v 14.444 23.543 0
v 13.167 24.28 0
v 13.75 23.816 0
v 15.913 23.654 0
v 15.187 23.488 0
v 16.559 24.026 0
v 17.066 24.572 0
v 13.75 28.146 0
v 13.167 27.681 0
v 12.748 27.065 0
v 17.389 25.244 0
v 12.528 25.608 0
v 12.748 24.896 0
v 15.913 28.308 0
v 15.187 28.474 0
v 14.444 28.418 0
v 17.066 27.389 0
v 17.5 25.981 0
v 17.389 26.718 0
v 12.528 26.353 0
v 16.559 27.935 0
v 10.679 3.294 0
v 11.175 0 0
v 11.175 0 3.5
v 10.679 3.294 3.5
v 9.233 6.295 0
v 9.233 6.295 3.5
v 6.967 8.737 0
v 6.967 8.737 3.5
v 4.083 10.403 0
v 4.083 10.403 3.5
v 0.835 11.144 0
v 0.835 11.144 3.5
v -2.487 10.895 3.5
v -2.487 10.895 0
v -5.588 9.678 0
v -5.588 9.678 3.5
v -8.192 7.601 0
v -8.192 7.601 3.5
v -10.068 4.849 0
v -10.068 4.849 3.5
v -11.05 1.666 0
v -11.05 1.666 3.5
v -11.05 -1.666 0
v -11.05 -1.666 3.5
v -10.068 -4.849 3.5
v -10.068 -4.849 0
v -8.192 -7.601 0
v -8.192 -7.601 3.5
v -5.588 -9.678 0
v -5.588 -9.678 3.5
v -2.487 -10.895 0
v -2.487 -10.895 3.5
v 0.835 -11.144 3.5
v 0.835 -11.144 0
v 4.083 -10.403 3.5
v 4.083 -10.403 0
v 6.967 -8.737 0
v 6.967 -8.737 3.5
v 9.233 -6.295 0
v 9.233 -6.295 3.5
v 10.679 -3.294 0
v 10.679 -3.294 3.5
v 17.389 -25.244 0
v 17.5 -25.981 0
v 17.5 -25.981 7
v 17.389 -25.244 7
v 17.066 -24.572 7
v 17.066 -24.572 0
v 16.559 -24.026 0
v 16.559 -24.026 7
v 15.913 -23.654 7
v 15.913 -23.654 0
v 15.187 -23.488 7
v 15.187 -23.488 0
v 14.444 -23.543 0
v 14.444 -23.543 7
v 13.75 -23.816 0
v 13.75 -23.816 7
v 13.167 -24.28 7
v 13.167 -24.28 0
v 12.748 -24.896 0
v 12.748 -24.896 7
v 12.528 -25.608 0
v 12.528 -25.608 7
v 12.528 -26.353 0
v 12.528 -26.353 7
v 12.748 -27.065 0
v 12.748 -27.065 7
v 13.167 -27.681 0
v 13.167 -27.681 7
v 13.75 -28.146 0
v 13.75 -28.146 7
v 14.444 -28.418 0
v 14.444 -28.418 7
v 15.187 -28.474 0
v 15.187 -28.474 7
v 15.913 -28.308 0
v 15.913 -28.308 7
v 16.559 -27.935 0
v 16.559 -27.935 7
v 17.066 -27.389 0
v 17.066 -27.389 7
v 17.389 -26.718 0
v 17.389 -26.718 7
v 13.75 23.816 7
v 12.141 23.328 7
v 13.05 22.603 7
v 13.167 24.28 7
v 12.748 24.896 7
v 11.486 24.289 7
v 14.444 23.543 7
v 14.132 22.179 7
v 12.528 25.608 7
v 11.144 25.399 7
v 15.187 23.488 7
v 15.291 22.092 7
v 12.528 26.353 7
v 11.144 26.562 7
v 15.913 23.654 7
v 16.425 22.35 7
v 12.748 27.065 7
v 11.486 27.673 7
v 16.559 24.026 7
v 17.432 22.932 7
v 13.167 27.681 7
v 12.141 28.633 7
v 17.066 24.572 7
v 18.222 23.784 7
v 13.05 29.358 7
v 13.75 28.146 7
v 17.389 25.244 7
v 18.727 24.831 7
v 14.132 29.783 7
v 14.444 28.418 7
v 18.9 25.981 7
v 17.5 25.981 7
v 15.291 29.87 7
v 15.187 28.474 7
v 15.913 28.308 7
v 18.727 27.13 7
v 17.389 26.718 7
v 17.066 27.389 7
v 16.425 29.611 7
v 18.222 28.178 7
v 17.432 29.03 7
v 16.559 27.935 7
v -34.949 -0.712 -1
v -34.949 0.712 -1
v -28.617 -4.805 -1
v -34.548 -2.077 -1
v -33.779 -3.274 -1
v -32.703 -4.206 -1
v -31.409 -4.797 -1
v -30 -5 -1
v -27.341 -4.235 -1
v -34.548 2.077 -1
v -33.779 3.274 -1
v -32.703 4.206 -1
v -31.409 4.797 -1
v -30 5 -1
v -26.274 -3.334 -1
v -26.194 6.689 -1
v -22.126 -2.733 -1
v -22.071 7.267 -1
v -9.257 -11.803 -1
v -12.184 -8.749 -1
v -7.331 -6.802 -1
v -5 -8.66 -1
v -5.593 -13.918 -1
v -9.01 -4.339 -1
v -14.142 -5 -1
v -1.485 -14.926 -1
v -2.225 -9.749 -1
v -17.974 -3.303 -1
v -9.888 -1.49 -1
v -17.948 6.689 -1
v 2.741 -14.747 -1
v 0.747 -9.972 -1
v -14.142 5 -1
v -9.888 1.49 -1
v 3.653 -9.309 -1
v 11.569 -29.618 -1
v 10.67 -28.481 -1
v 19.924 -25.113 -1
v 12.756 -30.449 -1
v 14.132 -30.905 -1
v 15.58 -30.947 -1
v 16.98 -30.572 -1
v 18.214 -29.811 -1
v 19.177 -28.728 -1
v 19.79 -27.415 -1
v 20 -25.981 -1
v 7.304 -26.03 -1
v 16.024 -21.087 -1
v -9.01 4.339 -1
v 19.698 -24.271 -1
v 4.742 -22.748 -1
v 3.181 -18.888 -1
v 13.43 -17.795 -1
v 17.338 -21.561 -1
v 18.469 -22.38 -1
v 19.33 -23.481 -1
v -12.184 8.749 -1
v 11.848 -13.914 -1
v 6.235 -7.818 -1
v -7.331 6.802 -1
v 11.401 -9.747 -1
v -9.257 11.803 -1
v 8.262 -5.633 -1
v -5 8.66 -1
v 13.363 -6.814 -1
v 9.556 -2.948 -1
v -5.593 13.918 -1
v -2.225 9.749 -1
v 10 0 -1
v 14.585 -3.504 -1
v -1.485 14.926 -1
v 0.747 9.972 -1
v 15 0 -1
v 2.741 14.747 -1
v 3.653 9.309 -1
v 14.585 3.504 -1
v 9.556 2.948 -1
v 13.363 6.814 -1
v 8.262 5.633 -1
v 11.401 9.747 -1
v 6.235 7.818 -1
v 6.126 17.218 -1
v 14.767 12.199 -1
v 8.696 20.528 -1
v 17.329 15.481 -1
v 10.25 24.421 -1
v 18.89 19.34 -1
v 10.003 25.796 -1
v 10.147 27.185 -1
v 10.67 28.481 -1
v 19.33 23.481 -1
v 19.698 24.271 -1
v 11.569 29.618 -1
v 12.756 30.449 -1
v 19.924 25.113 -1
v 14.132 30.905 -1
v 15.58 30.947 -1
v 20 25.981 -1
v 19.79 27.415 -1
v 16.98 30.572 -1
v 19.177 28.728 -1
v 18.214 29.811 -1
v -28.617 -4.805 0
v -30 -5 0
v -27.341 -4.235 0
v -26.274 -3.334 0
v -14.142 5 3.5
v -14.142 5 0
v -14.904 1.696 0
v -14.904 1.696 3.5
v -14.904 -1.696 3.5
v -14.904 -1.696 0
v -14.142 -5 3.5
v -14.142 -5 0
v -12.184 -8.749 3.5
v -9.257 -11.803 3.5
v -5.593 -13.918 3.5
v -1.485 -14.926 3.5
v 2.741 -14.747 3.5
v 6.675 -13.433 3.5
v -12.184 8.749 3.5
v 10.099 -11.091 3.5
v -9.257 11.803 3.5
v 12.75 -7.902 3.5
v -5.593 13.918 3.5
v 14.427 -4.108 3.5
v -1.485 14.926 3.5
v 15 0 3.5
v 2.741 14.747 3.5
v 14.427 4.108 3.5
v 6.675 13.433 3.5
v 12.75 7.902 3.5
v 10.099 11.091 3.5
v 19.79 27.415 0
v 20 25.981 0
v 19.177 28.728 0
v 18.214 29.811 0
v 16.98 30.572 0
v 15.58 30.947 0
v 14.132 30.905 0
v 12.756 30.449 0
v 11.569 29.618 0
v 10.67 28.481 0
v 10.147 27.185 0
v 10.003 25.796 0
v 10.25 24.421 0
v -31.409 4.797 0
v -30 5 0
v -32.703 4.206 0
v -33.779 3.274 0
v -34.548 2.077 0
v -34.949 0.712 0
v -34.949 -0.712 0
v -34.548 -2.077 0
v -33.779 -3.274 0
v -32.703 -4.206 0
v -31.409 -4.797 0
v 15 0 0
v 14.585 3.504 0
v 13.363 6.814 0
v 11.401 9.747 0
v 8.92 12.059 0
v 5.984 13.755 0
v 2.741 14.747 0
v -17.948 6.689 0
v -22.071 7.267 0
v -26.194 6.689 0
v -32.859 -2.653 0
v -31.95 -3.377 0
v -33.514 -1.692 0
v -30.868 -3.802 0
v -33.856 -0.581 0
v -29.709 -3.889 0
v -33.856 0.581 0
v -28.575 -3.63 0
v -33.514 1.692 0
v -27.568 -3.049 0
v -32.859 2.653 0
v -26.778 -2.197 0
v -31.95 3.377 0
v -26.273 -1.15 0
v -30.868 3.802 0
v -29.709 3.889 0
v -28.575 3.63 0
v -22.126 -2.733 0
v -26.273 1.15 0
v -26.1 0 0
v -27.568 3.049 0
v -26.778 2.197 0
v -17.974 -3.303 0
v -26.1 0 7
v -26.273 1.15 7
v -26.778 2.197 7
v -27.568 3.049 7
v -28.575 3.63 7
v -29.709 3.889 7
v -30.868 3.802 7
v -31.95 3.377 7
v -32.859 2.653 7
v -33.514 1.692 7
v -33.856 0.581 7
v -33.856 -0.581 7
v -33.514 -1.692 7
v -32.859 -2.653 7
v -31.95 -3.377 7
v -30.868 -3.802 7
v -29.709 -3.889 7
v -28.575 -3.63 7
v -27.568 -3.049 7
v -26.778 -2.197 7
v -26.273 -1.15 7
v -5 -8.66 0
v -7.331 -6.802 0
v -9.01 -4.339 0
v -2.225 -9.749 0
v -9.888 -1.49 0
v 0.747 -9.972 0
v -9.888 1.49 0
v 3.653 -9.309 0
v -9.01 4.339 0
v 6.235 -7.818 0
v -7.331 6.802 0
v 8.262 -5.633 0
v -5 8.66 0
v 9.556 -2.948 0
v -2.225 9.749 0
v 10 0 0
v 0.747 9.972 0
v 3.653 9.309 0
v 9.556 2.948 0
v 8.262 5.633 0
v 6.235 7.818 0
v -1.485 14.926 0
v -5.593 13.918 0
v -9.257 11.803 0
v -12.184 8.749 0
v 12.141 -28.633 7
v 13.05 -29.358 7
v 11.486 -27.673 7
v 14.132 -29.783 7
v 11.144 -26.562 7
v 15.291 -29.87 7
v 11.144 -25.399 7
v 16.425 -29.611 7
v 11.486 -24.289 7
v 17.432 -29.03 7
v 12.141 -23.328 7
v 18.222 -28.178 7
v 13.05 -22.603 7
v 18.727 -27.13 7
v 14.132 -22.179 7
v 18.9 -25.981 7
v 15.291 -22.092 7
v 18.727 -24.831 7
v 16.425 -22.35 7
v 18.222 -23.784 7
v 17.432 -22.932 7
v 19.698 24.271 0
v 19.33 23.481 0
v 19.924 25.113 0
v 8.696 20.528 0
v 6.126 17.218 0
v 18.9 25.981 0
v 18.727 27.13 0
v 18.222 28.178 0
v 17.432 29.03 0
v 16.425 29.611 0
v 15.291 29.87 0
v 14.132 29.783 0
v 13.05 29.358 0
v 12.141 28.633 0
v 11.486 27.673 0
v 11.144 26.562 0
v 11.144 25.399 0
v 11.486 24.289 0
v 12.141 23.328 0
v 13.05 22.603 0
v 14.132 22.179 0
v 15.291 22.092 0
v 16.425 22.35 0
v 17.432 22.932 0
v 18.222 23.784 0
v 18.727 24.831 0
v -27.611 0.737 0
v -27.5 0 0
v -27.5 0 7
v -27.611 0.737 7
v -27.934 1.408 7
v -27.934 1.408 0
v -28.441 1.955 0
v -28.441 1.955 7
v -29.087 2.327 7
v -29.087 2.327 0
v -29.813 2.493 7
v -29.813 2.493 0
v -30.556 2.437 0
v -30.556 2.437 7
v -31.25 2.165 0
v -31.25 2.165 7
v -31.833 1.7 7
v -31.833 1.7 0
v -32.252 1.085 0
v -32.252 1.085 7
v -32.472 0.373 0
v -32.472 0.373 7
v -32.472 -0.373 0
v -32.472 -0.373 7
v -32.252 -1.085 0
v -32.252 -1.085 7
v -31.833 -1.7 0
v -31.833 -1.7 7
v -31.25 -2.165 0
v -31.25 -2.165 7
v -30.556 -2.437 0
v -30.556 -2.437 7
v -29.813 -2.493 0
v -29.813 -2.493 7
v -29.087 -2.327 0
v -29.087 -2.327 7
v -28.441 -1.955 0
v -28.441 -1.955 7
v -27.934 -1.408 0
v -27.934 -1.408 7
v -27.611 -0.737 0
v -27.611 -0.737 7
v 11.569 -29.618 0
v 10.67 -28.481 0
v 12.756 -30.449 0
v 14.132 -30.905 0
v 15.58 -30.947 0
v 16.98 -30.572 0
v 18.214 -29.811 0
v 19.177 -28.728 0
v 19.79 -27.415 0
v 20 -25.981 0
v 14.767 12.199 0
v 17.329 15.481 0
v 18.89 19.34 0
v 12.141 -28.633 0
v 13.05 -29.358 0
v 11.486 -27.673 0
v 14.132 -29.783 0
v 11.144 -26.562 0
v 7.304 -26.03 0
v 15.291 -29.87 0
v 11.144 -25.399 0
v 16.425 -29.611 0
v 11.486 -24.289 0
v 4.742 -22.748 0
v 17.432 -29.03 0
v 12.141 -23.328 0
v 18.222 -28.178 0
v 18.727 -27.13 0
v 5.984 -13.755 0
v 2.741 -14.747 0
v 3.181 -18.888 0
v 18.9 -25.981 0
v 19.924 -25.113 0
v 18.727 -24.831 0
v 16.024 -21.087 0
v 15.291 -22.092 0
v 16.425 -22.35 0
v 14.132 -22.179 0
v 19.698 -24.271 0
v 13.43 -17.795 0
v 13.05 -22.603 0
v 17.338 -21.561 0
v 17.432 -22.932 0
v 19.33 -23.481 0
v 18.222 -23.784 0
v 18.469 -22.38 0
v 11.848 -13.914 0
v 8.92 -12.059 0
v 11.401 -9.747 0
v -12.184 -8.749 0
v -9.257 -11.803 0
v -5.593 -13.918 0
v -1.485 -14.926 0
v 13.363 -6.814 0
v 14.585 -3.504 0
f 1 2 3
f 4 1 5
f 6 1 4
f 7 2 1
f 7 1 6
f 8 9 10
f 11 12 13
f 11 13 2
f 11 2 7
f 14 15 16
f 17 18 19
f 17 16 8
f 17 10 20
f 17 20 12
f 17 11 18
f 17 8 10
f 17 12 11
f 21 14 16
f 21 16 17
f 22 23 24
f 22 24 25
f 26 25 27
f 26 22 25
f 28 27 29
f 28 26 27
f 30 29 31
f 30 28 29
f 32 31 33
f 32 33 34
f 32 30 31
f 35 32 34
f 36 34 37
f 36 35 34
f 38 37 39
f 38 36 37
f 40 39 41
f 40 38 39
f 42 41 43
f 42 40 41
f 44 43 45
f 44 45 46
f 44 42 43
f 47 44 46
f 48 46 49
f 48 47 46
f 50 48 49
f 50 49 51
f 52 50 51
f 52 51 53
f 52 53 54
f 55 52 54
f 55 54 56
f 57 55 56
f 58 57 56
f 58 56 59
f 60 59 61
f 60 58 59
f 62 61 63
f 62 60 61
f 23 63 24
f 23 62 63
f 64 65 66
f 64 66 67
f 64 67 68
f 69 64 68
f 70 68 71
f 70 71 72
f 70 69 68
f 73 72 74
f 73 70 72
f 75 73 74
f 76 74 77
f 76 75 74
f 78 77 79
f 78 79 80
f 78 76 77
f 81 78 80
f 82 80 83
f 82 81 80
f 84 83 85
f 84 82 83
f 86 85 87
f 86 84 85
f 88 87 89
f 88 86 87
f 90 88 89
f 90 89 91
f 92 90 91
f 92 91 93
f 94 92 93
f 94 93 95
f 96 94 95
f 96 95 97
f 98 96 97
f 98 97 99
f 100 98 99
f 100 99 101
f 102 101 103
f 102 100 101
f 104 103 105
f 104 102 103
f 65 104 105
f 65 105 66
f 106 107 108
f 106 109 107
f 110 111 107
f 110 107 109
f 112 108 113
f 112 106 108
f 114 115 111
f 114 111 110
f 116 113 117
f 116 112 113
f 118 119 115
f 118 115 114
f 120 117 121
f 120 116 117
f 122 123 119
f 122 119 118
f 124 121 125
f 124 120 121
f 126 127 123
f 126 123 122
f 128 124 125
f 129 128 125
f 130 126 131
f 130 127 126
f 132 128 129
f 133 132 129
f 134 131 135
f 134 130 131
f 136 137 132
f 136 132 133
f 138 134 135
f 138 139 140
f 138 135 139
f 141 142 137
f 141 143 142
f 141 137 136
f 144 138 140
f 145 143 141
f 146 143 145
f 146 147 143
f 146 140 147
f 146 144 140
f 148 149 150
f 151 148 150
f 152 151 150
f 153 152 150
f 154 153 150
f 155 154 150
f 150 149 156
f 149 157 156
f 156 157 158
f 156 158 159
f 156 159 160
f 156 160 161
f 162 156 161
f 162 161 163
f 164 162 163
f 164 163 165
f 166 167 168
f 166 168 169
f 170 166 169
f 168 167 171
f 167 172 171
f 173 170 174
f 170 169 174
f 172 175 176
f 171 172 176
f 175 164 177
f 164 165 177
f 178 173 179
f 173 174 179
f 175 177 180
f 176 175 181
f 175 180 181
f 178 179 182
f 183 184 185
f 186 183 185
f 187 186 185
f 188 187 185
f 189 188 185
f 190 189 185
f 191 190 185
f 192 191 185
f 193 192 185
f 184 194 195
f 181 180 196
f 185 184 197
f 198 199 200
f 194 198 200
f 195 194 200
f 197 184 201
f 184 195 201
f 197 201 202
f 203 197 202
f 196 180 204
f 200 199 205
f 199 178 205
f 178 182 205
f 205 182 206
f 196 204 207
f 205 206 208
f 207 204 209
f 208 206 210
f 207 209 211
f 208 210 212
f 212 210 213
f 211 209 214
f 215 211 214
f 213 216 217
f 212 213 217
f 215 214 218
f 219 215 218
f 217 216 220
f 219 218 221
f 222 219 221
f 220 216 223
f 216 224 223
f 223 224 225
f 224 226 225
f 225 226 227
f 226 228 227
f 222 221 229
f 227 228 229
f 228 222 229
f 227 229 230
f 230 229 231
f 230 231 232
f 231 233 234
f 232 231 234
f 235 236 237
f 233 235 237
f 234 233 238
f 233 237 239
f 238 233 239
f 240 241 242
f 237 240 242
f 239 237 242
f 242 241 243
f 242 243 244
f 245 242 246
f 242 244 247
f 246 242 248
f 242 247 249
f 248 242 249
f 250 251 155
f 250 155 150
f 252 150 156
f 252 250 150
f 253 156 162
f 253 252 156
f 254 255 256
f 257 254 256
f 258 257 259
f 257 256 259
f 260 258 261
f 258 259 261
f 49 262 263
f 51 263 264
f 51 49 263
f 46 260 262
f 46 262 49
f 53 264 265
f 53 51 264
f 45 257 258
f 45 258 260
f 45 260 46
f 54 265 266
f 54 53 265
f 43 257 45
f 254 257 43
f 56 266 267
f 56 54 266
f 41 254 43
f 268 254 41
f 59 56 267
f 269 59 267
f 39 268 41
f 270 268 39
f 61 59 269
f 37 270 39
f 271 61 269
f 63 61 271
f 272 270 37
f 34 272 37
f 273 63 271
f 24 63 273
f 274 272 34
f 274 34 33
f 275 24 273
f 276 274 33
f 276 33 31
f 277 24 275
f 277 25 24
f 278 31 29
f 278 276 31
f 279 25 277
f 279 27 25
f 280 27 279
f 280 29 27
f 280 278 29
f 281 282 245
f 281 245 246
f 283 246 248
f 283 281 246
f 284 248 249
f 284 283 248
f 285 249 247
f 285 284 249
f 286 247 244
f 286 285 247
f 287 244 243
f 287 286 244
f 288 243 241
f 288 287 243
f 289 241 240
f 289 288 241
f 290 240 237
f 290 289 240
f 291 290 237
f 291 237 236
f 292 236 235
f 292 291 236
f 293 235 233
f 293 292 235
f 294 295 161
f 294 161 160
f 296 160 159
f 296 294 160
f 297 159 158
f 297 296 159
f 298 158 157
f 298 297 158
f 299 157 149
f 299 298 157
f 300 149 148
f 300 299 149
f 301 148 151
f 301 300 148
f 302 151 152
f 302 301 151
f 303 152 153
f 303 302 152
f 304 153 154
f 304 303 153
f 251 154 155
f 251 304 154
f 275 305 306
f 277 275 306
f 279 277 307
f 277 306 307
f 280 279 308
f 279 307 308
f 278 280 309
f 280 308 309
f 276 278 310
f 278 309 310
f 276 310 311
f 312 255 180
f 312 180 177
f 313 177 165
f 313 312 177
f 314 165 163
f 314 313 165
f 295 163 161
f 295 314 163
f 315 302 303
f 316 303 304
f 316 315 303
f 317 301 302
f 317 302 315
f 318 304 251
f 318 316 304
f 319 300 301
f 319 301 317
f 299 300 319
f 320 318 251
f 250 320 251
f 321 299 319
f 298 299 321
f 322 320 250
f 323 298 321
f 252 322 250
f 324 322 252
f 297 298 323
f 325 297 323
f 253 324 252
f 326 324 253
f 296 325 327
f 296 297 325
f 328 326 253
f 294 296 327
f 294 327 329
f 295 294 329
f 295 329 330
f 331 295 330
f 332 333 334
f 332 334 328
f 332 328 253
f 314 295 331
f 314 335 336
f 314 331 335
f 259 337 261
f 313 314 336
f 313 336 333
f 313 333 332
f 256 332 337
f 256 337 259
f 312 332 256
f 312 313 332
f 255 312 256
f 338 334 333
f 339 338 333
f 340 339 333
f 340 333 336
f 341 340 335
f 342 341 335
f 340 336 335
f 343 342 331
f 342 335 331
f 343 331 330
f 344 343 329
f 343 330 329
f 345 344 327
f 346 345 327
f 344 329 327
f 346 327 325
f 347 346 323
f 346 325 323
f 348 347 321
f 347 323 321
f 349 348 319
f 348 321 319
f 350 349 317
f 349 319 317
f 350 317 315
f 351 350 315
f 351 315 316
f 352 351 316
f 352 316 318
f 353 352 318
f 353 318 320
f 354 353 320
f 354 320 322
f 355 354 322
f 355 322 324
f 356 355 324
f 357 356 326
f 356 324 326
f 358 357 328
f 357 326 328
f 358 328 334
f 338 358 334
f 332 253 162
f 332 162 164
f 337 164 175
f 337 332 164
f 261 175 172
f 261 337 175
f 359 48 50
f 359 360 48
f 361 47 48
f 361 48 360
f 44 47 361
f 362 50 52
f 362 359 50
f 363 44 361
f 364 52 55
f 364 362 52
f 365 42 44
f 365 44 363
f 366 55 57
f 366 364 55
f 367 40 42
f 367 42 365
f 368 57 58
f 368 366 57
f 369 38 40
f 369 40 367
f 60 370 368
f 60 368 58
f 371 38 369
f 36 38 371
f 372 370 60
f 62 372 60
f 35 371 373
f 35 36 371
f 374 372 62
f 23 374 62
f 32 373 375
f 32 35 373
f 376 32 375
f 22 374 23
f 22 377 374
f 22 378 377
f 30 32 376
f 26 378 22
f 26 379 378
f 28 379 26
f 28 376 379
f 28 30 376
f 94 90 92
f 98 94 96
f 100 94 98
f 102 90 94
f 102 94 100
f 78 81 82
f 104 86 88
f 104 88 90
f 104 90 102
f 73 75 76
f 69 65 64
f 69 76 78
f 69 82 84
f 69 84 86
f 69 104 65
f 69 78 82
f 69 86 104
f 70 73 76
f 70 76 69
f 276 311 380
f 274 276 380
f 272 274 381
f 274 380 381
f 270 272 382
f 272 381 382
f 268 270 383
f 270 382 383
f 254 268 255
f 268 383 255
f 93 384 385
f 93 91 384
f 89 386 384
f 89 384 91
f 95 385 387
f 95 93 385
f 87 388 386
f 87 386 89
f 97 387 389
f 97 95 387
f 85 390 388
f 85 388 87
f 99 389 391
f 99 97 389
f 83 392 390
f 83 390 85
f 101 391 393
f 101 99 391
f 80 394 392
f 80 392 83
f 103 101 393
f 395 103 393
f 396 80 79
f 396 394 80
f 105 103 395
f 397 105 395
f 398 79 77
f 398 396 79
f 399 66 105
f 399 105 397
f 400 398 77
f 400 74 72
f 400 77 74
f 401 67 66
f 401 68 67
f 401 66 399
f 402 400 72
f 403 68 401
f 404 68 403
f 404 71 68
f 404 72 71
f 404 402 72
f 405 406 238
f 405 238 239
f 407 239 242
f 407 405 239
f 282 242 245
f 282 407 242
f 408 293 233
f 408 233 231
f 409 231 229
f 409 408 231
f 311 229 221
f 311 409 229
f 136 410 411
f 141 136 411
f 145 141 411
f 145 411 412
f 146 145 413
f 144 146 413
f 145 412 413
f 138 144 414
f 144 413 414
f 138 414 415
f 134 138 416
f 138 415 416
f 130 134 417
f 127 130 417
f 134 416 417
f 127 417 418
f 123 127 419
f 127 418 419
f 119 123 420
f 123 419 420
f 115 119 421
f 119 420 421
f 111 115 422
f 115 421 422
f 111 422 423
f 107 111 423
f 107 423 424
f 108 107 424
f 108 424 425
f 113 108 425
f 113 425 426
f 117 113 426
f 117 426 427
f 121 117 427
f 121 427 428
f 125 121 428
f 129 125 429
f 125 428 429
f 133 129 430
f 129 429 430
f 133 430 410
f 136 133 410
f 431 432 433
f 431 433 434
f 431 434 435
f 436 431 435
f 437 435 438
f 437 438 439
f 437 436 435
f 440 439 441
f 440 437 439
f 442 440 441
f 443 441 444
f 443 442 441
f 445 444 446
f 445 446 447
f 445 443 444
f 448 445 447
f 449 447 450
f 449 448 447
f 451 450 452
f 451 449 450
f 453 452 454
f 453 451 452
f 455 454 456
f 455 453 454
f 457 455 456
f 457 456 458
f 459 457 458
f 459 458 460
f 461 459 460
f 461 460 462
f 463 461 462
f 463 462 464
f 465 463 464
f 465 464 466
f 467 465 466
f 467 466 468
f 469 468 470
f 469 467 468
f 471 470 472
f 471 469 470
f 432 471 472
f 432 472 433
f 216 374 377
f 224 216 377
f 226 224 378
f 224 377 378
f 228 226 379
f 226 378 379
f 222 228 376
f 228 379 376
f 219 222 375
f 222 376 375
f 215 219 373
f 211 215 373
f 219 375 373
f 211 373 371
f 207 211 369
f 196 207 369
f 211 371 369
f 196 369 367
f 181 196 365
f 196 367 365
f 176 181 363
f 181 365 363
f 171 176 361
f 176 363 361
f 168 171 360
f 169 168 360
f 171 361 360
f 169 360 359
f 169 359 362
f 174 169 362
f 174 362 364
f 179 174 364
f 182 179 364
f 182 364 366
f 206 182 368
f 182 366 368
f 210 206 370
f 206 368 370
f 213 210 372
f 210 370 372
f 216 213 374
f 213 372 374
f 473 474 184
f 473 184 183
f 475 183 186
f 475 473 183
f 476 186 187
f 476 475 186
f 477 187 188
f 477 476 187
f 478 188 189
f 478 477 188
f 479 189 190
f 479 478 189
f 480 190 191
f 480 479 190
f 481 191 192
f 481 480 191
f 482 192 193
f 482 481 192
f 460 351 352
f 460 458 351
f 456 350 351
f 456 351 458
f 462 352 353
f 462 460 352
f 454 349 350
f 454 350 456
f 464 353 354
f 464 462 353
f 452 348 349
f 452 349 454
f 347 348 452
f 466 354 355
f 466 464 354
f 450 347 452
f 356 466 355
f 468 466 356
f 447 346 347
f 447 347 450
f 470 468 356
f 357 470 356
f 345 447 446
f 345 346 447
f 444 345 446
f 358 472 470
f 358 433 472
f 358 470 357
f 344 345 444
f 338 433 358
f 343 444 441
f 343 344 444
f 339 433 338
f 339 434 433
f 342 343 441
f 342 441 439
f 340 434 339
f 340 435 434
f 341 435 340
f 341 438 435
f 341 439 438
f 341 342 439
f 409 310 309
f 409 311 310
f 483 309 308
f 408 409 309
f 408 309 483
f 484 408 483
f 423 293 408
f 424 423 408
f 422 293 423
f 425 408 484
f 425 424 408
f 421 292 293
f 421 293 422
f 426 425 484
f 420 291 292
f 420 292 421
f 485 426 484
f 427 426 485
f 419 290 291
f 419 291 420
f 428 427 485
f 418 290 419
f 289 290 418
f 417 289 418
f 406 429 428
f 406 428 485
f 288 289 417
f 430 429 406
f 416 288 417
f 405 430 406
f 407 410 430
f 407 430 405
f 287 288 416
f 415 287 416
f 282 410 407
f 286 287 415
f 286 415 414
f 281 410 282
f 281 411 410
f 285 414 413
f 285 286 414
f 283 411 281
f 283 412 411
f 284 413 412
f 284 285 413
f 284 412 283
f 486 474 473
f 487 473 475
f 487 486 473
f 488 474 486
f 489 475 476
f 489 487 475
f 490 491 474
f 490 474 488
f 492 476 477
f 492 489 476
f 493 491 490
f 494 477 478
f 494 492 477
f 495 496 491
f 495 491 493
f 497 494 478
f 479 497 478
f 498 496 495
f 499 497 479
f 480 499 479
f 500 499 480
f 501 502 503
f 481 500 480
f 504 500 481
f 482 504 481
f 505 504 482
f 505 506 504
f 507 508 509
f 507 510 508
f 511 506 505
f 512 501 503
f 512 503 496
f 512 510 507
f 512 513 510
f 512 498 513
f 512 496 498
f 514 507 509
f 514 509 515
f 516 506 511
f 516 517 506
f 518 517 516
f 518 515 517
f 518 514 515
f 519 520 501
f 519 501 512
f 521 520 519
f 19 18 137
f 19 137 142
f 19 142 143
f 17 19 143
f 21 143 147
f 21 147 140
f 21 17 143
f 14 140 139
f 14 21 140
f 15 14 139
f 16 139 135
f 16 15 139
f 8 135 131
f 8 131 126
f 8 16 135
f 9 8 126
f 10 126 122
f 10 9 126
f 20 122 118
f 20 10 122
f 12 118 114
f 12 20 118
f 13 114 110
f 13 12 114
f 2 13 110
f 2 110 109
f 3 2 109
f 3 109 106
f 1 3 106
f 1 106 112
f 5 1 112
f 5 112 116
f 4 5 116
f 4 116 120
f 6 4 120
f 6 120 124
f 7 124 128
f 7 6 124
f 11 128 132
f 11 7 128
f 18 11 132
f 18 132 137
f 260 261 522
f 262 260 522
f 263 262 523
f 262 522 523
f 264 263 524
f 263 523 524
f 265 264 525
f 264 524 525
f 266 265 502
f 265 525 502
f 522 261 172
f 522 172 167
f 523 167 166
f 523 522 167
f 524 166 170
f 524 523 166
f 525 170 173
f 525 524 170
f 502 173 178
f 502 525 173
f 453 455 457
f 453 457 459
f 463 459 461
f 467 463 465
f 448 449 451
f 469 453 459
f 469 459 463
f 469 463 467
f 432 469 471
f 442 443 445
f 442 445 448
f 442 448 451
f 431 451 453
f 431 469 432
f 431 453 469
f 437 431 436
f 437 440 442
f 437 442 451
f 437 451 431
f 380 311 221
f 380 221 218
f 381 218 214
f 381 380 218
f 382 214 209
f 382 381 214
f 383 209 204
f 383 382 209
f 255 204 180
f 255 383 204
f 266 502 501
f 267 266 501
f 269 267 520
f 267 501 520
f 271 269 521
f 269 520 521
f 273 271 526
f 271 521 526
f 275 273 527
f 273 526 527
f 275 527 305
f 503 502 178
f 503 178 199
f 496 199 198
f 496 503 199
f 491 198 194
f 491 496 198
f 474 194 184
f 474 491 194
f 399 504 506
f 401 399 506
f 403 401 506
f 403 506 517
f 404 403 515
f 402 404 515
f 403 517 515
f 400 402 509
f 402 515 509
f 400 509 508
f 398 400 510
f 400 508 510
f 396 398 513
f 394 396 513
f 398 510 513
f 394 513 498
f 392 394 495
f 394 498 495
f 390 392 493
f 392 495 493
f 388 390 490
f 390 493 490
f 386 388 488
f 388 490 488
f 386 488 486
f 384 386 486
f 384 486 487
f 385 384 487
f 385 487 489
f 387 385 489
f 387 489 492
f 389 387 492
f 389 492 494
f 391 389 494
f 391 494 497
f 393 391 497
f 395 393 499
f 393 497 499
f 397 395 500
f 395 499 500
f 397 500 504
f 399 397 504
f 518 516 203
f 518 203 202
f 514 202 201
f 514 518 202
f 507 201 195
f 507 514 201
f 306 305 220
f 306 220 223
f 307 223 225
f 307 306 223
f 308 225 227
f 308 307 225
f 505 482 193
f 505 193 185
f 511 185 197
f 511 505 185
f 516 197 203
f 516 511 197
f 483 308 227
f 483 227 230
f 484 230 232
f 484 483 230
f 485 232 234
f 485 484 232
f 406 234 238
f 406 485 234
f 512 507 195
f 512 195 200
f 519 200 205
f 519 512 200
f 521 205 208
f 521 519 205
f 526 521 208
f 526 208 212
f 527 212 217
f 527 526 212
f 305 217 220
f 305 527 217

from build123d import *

# Parameters (mm, degrees)
F0_R     = 11.175
F0_R_2   = 10
F0_R_3   = 3.9
F0_R_4   = 2.5
F1_DEPTH = 1
F2_DEPTH = 7
F3_DEPTH = 3.5


with BuildPart() as f1:
    # F0 (on Top) → F1 (new body)
    with BuildSketch(Plane.XY):
        with BuildLine():
            ThreePointArc((11.4011948308, -9.7474487139), (14.0715656993, -5.1952900563), (15, 0))
            ThreePointArc((15, 0), (14.0715656993, 5.1952900563), (11.4011948308, 9.7474487139))
            ThreePointArc((11.4011948308, 9.7474487139), (7.5, 12.9903810568), (2.7409407929, 14.7474487139))
            ThreePointArc((2.7409407929, 14.7474487139), (-7.5, 12.9903810568), (-14.1421356237, 5))
            ThreePointArc((-14.1421356237, 5), (-15, 0), (-14.1421356237, -5))
            ThreePointArc((-14.1421356237, -5), (-7.5, -12.9903810568), (2.7409407929, -14.7474487139))
            ThreePointArc((2.7409407929, -14.7474487139), (7.5, -12.9903810568), (11.4011948308, -9.7474487139))
        make_face()
        Circle(F0_R, mode=Mode.SUBTRACT)
        Circle(F0_R)
        Circle(F0_R_2, mode=Mode.SUBTRACT)
        with BuildLine():
            ThreePointArc((-14.1421356237, -5), (-15, 0), (-14.1421356237, 5))
            ThreePointArc((-14.1421356237, 5), (-22.0710678119, 7.2668921957), (-30, 5))
            ThreePointArc((-30, 5), (-26.4644660941, 3.5355339059), (-25, 0))
            ThreePointArc((-25, 0), (-25.3292685703, -1.7844517118), (-26.2737071647, -3.333877878))
            ThreePointArc((-26.2737071647, -3.333877878), (-20.0301598509, -2.8725999161), (-14.1421356237, -5))
        make_face()
        with BuildLine():
            ThreePointArc((2.7409407929, 14.7474487139), (7.5, 12.9903810568), (11.4011948308, 9.7474487139))
            ThreePointArc((11.4011948308, 9.7474487139), (17.328847154, 15.4806593159), (19.3301270189, 23.4807621135))
            ThreePointArc((19.3301270189, 23.4807621135), (14.4852262544, 21.0073319099), (10.2496306469, 24.4206367952))
            ThreePointArc((10.2496306469, 24.4206367952), (7.5273354232, 18.7829272308), (2.7409407929, 14.7474487139))
        make_face()
        with BuildLine():
            ThreePointArc((16.0240765178, -21.0867589172), (12.5028244277, -15.9103273147), (11.4011948308, -9.7474487139))
            ThreePointArc((11.4011948308, -9.7474487139), (7.5, -12.9903810568), (2.7409407929, -14.7474487139))
            ThreePointArc((2.7409407929, -14.7474487139), (4.7422206579, -22.7475515116), (10.6698729811, -28.4807621135))
            ThreePointArc((10.6698729811, -28.4807621135), (10.9502699725, -23.0482398708), (16.0240765178, -21.0867589172))
        make_face()
        with BuildLine():
            ThreePointArc((-25, 0), (-26.4644660941, 3.5355339059), (-30, 5))
            ThreePointArc((-30, 5), (-35, 0), (-30, -5))
            ThreePointArc((-30, -5), (-28.1937916946, -4.0395964849), (-26.2737071647, -3.333877878))
            ThreePointArc((-26.2737071647, -3.333877878), (-25.3292685703, -1.7844517118), (-25, 0))
        make_face()
        with Locations((-30, 0)):
            Circle(F0_R_3, mode=Mode.SUBTRACT)
        with BuildLine():
            ThreePointArc((19.3301270189, -23.4807621135), (17.5952890243, -22.3967415941), (16.0240765178, -21.0867589172))
            ThreePointArc((16.0240765178, -21.0867589172), (10.9502699725, -23.0482398708), (10.6698729811, -28.4807621135))
            ThreePointArc((10.6698729811, -28.4807621135), (16.2940952255, -30.810391245), (20, -25.9807621135))
            ThreePointArc((20, -25.9807621135), (19.8296291314, -24.686666888), (19.3301270189, -23.4807621135))
        make_face()
        with Locations((15, -25.9807621135)):
            Circle(F0_R_3, mode=Mode.SUBTRACT)
        with BuildLine():
            ThreePointArc((10.2496306469, 24.4206367952), (14.4852262544, 21.0073319099), (19.3301270189, 23.4807621135))
            ThreePointArc((19.3301270189, 23.4807621135), (19.8296291314, 24.686666888), (20, 25.9807621135))
            ThreePointArc((20, 25.9807621135), (16.2940952255, 30.810391245), (10.6698729811, 28.4807621135))
            ThreePointArc((10.6698729811, 28.4807621135), (10.5985026704, 26.436338079), (10.2496306469, 24.4206367952))
        make_face()
        with Locations((15, 25.9807621135)):
            Circle(F0_R_3, mode=Mode.SUBTRACT)
        with Locations((-30, 0)):
            Circle(F0_R_3)
        with Locations((-30, 0)):
            Circle(F0_R_4, mode=Mode.SUBTRACT)
        with Locations((15, -25.9807621135)):
            Circle(F0_R_3)
        with Locations((15, -25.9807621135)):
            Circle(F0_R_4, mode=Mode.SUBTRACT)
        with Locations((15, 25.9807621135)):
            Circle(F0_R_3)
        with Locations((15, 25.9807621135)):
            Circle(F0_R_4, mode=Mode.SUBTRACT)
        with Locations((-30, 0)):
            Circle(F0_R_4)
        with Locations((15, -25.9807621135)):
            Circle(F0_R_4)
        with Locations((15, 25.9807621135)):
            Circle(F0_R_4)
        with BuildLine():
            ThreePointArc((-30, -5), (-27.9590920391, -4.5645037731), (-26.2737071647, -3.333877878))
            ThreePointArc((-26.2737071647, -3.333877878), (-28.1937916946, -4.0395964849), (-30, -5))
        make_face()
        with BuildLine():
            ThreePointArc((19.3301270189, -23.4807621135), (17.9325222427, -21.931032086), (16.0240765178, -21.0867589172))
            ThreePointArc((16.0240765178, -21.0867589172), (17.5952890243, -22.3967415941), (19.3301270189, -23.4807621135))
        make_face()
        with BuildLine():
            ThreePointArc((10.6698729811, 28.4807621135), (10.0265697963, 26.4955358592), (10.2496306469, 24.4206367952))
            ThreePointArc((10.2496306469, 24.4206367952), (10.5985026704, 26.436338079), (10.6698729811, 28.4807621135))
        make_face()
    extrude(amount=-F1_DEPTH)

    # F0 (on Top) → F2 (join)
    with BuildSketch(Plane.XY):
        with Locations((-30, 0)):
            Circle(F0_R_3)
        with Locations((-30, 0)):
            Circle(F0_R_4, mode=Mode.SUBTRACT)
        with Locations((15, 25.9807621135)):
            Circle(F0_R_3)
        with Locations((15, 25.9807621135)):
            Circle(F0_R_4, mode=Mode.SUBTRACT)
        with Locations((15, -25.9807621135)):
            Circle(F0_R_3)
        with Locations((15, -25.9807621135)):
            Circle(F0_R_4, mode=Mode.SUBTRACT)
    extrude(amount=F2_DEPTH)

    # F0 (on Top) → F3 (join)
    with BuildSketch(Plane.XY):
        with BuildLine():
            ThreePointArc((11.4011948308, -9.7474487139), (14.0715656993, -5.1952900563), (15, 0))
            ThreePointArc((15, 0), (14.0715656993, 5.1952900563), (11.4011948308, 9.7474487139))
            ThreePointArc((11.4011948308, 9.7474487139), (7.5, 12.9903810568), (2.7409407929, 14.7474487139))
            ThreePointArc((2.7409407929, 14.7474487139), (-7.5, 12.9903810568), (-14.1421356237, 5))
            ThreePointArc((-14.1421356237, 5), (-15, 0), (-14.1421356237, -5))
            ThreePointArc((-14.1421356237, -5), (-7.5, -12.9903810568), (2.7409407929, -14.7474487139))
            ThreePointArc((2.7409407929, -14.7474487139), (7.5, -12.9903810568), (11.4011948308, -9.7474487139))
        make_face()
        Circle(F0_R, mode=Mode.SUBTRACT)
    extrude(amount=F3_DEPTH)


solid = f1.part
